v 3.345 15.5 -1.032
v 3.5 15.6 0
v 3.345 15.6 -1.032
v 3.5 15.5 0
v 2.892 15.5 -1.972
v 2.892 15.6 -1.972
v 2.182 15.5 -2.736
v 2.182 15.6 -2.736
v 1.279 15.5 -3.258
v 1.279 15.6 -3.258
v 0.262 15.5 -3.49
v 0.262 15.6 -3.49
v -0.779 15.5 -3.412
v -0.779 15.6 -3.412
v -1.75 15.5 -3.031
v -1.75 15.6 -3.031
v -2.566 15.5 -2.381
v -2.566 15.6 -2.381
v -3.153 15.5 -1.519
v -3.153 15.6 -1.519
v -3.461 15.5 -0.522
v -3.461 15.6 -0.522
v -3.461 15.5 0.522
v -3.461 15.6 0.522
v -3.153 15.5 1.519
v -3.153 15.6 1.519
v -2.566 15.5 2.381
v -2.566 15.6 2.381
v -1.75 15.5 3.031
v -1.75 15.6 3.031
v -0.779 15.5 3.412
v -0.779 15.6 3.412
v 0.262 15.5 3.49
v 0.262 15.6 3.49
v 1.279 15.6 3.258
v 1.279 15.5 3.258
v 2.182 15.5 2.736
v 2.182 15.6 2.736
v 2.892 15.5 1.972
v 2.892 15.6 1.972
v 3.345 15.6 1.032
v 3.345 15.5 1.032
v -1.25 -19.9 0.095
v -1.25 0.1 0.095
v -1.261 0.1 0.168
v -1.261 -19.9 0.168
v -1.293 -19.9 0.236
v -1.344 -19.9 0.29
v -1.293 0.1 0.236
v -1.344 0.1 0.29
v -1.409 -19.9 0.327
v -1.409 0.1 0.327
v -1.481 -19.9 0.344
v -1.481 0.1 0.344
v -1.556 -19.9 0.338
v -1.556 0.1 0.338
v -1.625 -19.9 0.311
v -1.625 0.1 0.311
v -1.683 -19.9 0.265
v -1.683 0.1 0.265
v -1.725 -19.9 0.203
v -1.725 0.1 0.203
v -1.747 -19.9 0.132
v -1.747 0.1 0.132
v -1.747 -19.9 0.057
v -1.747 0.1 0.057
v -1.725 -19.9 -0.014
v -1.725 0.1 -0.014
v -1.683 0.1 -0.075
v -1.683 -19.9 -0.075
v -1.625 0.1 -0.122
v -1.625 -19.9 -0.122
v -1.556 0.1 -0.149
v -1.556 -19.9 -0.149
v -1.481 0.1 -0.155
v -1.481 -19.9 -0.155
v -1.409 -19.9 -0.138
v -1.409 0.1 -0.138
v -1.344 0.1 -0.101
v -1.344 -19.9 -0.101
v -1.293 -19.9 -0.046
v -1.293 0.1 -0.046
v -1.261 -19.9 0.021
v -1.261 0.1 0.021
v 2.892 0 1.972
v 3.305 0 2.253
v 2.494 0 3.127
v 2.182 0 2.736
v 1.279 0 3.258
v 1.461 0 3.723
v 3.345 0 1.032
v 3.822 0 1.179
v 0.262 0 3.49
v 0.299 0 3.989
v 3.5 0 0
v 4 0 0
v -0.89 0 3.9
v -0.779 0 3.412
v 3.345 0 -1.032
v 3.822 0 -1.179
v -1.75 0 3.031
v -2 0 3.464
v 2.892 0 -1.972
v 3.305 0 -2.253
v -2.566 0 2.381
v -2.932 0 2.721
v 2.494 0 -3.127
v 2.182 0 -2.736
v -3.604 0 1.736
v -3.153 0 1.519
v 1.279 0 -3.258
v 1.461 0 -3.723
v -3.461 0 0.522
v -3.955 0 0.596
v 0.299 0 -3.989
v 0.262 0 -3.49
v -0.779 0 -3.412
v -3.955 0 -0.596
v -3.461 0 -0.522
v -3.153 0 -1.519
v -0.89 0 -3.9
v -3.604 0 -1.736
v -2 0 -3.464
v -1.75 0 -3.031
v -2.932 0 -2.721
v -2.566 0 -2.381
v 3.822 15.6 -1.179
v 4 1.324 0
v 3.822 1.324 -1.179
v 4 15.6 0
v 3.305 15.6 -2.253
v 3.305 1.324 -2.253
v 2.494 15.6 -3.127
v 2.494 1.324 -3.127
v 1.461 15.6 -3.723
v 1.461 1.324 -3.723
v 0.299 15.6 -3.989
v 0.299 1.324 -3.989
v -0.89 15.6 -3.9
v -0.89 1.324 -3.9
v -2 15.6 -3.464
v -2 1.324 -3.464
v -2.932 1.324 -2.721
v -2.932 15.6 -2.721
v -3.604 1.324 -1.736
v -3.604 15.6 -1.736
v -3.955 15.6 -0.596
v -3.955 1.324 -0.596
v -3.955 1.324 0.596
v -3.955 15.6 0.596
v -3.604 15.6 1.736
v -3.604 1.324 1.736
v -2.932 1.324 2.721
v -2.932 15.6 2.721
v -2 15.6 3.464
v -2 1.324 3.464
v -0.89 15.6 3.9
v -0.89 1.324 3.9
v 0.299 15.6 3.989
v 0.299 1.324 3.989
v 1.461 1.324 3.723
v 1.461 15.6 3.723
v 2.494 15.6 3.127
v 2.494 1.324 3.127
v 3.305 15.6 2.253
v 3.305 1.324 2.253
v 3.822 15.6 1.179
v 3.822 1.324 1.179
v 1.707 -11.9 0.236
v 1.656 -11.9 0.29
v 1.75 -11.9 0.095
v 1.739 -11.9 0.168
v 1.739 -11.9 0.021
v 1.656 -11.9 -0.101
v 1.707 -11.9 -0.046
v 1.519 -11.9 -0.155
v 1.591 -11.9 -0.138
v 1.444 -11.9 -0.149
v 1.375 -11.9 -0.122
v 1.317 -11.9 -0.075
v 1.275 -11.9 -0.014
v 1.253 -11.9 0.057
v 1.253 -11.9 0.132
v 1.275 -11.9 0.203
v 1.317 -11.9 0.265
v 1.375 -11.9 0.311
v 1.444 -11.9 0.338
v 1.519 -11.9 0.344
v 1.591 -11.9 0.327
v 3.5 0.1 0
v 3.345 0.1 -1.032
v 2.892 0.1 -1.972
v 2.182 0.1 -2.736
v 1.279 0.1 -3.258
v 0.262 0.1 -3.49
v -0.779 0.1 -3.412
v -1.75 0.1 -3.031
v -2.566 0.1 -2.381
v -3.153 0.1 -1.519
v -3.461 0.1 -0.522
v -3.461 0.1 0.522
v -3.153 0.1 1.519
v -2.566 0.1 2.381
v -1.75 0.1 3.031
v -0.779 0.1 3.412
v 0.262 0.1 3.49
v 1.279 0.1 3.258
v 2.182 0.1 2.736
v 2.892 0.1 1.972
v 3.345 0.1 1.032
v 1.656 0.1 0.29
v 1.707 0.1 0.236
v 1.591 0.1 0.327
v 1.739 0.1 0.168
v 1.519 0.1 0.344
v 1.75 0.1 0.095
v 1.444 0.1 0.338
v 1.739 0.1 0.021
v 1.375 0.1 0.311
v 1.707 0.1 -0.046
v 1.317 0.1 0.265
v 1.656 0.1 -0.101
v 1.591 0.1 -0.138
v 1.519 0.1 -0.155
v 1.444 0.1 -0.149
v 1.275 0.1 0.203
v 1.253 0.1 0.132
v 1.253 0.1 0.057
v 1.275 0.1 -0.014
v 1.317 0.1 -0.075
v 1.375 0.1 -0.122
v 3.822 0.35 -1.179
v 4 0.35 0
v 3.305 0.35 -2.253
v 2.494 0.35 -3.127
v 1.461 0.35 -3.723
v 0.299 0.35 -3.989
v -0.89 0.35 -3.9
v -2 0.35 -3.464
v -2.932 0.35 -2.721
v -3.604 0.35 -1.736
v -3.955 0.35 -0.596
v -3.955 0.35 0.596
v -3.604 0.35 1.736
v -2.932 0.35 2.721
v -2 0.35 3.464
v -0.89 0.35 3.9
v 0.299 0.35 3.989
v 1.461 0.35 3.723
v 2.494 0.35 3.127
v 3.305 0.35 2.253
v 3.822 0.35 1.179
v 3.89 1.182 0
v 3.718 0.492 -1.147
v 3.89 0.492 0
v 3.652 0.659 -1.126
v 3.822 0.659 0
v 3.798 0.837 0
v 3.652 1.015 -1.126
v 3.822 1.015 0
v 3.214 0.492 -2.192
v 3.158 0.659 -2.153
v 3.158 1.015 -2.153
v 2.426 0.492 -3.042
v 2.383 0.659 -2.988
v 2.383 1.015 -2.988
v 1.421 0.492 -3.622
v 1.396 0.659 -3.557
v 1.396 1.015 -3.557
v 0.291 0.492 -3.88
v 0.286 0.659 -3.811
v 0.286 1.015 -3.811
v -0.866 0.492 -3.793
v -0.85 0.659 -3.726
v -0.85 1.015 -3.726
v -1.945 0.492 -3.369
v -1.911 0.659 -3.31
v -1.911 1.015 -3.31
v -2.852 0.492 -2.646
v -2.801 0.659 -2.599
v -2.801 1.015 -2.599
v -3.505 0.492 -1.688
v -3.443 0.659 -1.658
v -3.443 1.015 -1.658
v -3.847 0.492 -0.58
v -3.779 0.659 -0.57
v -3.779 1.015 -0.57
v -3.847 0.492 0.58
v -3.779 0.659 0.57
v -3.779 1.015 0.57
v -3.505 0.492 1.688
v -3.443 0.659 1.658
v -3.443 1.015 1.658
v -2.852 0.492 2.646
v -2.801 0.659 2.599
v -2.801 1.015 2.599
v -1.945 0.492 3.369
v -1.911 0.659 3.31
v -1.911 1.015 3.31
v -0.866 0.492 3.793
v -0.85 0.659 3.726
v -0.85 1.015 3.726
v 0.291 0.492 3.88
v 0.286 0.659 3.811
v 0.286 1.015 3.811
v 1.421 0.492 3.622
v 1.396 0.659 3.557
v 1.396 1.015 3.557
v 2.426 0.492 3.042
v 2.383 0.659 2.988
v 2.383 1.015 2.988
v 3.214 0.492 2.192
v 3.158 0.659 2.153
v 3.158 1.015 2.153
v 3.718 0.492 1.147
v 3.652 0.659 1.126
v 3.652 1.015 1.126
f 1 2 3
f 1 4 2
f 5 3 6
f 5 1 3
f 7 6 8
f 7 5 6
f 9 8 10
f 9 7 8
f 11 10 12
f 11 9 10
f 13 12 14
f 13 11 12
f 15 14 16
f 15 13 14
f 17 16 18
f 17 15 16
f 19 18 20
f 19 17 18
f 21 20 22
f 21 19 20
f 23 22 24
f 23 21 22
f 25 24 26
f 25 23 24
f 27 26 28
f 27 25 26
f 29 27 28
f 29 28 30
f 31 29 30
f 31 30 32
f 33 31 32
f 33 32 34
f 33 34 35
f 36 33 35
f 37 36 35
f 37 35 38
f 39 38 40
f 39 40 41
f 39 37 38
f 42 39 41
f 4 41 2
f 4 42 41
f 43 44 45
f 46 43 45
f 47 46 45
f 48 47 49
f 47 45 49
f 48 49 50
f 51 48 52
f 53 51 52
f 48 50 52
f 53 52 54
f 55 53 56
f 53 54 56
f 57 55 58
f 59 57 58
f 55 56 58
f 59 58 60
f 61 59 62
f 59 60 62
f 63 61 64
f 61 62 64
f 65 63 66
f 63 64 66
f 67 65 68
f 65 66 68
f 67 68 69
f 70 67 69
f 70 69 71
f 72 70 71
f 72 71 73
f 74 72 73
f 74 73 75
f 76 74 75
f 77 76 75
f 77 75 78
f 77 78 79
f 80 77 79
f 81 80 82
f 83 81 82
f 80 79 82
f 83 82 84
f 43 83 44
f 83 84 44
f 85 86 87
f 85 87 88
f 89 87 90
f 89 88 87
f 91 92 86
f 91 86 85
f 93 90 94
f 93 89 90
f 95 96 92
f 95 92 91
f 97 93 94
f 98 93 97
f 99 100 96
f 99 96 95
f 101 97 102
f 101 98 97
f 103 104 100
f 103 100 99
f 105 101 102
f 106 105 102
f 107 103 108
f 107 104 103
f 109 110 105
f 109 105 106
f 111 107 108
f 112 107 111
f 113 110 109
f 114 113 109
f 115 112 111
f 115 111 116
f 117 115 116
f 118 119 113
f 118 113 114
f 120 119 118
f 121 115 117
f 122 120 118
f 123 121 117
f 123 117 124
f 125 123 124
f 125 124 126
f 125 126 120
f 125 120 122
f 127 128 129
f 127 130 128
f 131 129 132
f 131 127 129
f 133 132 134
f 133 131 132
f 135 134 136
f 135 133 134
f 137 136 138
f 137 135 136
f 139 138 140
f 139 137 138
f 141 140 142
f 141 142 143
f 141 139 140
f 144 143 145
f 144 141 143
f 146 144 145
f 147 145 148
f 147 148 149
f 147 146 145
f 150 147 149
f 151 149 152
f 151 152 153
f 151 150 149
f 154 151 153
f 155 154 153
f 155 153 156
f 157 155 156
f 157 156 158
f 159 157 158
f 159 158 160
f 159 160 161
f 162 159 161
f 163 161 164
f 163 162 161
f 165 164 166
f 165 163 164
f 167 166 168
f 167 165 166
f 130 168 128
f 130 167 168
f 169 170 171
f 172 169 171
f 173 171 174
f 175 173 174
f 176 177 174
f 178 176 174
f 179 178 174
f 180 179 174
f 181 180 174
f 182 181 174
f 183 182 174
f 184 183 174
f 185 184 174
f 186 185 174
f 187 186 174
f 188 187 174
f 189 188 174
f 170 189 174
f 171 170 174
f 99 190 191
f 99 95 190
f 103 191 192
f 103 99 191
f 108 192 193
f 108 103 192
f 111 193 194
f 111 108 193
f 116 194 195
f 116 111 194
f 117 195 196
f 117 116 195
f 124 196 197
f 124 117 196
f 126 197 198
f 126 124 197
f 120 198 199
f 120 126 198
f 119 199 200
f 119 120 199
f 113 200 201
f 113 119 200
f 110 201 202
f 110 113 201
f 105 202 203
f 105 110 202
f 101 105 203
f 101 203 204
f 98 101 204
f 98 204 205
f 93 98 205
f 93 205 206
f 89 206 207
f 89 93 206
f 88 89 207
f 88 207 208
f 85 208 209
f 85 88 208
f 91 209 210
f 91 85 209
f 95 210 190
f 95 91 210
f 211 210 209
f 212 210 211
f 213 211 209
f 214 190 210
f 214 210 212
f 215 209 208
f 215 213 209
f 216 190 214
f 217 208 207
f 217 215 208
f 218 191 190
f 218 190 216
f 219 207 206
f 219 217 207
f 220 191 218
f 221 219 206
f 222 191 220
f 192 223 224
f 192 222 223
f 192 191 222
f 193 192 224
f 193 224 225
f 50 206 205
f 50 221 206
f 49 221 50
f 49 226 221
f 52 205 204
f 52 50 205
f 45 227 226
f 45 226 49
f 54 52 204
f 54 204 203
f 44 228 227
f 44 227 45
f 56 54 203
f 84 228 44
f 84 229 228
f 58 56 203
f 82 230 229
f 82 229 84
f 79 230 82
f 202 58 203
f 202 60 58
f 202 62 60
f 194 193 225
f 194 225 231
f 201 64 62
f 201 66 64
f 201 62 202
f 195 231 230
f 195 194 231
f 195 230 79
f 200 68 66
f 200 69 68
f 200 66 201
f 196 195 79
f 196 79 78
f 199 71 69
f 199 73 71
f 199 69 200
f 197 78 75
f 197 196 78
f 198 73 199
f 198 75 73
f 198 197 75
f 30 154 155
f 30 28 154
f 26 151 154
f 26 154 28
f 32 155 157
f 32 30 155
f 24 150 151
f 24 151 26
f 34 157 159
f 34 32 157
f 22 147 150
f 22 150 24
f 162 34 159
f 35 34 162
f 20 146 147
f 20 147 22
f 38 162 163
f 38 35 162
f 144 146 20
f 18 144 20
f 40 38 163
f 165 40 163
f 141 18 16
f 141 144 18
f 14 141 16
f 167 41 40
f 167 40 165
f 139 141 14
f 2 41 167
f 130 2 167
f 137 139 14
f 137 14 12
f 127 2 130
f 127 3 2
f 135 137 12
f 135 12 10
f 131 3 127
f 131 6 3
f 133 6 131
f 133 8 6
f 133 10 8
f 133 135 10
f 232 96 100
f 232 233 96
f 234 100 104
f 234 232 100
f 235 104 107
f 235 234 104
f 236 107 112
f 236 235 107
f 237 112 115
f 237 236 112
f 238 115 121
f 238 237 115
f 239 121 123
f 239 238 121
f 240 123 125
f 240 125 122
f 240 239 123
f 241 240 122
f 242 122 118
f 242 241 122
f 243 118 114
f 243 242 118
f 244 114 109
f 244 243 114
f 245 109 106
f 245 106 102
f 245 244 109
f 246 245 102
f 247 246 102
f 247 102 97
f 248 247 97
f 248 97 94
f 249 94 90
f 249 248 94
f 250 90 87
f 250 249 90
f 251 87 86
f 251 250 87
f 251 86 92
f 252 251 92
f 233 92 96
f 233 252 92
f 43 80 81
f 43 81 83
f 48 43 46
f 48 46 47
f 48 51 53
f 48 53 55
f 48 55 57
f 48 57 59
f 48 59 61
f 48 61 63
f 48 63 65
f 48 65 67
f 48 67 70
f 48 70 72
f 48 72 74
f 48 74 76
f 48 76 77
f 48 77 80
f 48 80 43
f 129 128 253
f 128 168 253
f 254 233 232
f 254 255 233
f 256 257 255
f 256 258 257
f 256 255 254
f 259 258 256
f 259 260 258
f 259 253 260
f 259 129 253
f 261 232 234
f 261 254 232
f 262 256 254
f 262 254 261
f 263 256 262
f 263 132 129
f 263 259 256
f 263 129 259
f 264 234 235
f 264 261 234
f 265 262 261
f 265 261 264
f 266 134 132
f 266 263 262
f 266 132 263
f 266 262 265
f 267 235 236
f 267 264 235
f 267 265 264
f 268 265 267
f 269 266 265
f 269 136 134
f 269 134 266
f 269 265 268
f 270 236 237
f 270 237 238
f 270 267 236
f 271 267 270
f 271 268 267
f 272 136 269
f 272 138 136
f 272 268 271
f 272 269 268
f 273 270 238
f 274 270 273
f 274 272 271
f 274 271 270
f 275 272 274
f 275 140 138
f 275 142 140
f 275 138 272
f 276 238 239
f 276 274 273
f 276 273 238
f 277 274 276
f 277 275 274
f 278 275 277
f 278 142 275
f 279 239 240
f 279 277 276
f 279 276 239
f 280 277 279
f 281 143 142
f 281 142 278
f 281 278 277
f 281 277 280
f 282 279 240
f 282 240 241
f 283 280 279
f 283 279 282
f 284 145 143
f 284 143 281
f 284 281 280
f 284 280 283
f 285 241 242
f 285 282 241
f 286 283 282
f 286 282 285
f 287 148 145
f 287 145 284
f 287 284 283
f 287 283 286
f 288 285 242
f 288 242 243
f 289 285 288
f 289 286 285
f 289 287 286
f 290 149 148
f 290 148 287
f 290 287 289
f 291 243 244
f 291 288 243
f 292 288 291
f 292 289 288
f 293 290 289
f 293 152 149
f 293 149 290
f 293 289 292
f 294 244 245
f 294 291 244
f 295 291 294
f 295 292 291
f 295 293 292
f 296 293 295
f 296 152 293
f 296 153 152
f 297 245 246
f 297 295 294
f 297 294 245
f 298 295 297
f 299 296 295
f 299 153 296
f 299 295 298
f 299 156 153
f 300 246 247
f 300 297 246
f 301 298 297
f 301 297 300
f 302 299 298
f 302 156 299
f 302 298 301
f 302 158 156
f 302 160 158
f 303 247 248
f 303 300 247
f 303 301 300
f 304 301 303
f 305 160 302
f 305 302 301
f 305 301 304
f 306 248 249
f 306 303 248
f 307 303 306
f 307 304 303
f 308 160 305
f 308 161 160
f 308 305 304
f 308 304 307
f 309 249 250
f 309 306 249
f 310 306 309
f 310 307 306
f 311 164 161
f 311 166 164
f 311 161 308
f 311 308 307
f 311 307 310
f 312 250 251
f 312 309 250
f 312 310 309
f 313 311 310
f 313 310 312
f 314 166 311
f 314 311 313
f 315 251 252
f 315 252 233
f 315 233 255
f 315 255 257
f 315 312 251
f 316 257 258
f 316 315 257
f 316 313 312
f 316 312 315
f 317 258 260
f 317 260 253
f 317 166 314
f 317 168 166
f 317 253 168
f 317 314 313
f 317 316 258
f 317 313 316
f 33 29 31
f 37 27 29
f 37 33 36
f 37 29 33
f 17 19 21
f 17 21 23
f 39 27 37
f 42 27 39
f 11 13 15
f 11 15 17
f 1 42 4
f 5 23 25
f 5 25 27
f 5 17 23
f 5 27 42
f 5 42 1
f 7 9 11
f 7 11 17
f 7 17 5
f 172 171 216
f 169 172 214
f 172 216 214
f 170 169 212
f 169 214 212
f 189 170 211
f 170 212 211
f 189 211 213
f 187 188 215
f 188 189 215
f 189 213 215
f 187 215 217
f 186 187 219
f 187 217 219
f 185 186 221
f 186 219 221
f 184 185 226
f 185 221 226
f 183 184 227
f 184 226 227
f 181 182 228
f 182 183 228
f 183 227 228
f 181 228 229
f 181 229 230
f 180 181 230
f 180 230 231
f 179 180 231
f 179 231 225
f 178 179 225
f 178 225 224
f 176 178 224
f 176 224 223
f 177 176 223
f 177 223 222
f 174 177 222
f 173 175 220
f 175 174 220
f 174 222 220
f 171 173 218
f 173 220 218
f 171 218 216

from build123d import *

# Parameters (mm, degrees)
SKETCH_2_R        = 0.25
EXTRUDE_1_DEPTH   = 20
OTHER_START       = -19.9
OTHER_1_OUTLINE_R = 0.25
OTHER_1_DEPTH     = 8


# Read off the part's stored shape, not the designer's step: 连接点1
with BuildPart() as part:
    # 草图1 → 旋转1 (revolve)
    with BuildSketch(Plane.XY):
        with BuildLine():
            Line((3.5, 0.1), (3.5, 0))
            Line((3.5, 0), (4, 0))
            Line((4, 0), (4, 0.349678286))
            ThreePointArc((4, 0.349678286), (3.798136614, 0.837019609), (4, 1.324360933))
            Line((4, 1.324360933), (4, 15.6))
            Line((4, 15.6), (3.5, 15.6))
            Line((3.5, 15.6), (3.5, 15.5))
            Line((3.5, 15.5), (0, 15.5))
            Line((0, 15.5), (0, 0.1))
            Line((0, 0.1), (3.5, 0.1))
        make_face()
    revolve(axis=Axis((0, 0, 0), (0, 1, 0)))

    # 草图2 → 凸台-拉伸1 (add)
    with BuildSketch(Plane.XZ.offset(-0.1)):
        with Locations((-1.5, 0.094730426)):
            Circle(SKETCH_2_R)
        with Locations((1.5, 0.094730426)):
            Circle(SKETCH_2_R)
    extrude(amount=EXTRUDE_1_DEPTH)

    # 连接点1 outline → 连接点1 (cut)
    with BuildSketch(Plane(origin=(0, 0, 0), x_dir=(1, 0, 0), z_dir=(0, 1, 0)).offset(OTHER_START)):
        with Locations((1.5, -0.094730426)):
            Circle(OTHER_1_OUTLINE_R)
    extrude(amount=OTHER_1_DEPTH, mode=Mode.SUBTRACT)


solid = part.part
